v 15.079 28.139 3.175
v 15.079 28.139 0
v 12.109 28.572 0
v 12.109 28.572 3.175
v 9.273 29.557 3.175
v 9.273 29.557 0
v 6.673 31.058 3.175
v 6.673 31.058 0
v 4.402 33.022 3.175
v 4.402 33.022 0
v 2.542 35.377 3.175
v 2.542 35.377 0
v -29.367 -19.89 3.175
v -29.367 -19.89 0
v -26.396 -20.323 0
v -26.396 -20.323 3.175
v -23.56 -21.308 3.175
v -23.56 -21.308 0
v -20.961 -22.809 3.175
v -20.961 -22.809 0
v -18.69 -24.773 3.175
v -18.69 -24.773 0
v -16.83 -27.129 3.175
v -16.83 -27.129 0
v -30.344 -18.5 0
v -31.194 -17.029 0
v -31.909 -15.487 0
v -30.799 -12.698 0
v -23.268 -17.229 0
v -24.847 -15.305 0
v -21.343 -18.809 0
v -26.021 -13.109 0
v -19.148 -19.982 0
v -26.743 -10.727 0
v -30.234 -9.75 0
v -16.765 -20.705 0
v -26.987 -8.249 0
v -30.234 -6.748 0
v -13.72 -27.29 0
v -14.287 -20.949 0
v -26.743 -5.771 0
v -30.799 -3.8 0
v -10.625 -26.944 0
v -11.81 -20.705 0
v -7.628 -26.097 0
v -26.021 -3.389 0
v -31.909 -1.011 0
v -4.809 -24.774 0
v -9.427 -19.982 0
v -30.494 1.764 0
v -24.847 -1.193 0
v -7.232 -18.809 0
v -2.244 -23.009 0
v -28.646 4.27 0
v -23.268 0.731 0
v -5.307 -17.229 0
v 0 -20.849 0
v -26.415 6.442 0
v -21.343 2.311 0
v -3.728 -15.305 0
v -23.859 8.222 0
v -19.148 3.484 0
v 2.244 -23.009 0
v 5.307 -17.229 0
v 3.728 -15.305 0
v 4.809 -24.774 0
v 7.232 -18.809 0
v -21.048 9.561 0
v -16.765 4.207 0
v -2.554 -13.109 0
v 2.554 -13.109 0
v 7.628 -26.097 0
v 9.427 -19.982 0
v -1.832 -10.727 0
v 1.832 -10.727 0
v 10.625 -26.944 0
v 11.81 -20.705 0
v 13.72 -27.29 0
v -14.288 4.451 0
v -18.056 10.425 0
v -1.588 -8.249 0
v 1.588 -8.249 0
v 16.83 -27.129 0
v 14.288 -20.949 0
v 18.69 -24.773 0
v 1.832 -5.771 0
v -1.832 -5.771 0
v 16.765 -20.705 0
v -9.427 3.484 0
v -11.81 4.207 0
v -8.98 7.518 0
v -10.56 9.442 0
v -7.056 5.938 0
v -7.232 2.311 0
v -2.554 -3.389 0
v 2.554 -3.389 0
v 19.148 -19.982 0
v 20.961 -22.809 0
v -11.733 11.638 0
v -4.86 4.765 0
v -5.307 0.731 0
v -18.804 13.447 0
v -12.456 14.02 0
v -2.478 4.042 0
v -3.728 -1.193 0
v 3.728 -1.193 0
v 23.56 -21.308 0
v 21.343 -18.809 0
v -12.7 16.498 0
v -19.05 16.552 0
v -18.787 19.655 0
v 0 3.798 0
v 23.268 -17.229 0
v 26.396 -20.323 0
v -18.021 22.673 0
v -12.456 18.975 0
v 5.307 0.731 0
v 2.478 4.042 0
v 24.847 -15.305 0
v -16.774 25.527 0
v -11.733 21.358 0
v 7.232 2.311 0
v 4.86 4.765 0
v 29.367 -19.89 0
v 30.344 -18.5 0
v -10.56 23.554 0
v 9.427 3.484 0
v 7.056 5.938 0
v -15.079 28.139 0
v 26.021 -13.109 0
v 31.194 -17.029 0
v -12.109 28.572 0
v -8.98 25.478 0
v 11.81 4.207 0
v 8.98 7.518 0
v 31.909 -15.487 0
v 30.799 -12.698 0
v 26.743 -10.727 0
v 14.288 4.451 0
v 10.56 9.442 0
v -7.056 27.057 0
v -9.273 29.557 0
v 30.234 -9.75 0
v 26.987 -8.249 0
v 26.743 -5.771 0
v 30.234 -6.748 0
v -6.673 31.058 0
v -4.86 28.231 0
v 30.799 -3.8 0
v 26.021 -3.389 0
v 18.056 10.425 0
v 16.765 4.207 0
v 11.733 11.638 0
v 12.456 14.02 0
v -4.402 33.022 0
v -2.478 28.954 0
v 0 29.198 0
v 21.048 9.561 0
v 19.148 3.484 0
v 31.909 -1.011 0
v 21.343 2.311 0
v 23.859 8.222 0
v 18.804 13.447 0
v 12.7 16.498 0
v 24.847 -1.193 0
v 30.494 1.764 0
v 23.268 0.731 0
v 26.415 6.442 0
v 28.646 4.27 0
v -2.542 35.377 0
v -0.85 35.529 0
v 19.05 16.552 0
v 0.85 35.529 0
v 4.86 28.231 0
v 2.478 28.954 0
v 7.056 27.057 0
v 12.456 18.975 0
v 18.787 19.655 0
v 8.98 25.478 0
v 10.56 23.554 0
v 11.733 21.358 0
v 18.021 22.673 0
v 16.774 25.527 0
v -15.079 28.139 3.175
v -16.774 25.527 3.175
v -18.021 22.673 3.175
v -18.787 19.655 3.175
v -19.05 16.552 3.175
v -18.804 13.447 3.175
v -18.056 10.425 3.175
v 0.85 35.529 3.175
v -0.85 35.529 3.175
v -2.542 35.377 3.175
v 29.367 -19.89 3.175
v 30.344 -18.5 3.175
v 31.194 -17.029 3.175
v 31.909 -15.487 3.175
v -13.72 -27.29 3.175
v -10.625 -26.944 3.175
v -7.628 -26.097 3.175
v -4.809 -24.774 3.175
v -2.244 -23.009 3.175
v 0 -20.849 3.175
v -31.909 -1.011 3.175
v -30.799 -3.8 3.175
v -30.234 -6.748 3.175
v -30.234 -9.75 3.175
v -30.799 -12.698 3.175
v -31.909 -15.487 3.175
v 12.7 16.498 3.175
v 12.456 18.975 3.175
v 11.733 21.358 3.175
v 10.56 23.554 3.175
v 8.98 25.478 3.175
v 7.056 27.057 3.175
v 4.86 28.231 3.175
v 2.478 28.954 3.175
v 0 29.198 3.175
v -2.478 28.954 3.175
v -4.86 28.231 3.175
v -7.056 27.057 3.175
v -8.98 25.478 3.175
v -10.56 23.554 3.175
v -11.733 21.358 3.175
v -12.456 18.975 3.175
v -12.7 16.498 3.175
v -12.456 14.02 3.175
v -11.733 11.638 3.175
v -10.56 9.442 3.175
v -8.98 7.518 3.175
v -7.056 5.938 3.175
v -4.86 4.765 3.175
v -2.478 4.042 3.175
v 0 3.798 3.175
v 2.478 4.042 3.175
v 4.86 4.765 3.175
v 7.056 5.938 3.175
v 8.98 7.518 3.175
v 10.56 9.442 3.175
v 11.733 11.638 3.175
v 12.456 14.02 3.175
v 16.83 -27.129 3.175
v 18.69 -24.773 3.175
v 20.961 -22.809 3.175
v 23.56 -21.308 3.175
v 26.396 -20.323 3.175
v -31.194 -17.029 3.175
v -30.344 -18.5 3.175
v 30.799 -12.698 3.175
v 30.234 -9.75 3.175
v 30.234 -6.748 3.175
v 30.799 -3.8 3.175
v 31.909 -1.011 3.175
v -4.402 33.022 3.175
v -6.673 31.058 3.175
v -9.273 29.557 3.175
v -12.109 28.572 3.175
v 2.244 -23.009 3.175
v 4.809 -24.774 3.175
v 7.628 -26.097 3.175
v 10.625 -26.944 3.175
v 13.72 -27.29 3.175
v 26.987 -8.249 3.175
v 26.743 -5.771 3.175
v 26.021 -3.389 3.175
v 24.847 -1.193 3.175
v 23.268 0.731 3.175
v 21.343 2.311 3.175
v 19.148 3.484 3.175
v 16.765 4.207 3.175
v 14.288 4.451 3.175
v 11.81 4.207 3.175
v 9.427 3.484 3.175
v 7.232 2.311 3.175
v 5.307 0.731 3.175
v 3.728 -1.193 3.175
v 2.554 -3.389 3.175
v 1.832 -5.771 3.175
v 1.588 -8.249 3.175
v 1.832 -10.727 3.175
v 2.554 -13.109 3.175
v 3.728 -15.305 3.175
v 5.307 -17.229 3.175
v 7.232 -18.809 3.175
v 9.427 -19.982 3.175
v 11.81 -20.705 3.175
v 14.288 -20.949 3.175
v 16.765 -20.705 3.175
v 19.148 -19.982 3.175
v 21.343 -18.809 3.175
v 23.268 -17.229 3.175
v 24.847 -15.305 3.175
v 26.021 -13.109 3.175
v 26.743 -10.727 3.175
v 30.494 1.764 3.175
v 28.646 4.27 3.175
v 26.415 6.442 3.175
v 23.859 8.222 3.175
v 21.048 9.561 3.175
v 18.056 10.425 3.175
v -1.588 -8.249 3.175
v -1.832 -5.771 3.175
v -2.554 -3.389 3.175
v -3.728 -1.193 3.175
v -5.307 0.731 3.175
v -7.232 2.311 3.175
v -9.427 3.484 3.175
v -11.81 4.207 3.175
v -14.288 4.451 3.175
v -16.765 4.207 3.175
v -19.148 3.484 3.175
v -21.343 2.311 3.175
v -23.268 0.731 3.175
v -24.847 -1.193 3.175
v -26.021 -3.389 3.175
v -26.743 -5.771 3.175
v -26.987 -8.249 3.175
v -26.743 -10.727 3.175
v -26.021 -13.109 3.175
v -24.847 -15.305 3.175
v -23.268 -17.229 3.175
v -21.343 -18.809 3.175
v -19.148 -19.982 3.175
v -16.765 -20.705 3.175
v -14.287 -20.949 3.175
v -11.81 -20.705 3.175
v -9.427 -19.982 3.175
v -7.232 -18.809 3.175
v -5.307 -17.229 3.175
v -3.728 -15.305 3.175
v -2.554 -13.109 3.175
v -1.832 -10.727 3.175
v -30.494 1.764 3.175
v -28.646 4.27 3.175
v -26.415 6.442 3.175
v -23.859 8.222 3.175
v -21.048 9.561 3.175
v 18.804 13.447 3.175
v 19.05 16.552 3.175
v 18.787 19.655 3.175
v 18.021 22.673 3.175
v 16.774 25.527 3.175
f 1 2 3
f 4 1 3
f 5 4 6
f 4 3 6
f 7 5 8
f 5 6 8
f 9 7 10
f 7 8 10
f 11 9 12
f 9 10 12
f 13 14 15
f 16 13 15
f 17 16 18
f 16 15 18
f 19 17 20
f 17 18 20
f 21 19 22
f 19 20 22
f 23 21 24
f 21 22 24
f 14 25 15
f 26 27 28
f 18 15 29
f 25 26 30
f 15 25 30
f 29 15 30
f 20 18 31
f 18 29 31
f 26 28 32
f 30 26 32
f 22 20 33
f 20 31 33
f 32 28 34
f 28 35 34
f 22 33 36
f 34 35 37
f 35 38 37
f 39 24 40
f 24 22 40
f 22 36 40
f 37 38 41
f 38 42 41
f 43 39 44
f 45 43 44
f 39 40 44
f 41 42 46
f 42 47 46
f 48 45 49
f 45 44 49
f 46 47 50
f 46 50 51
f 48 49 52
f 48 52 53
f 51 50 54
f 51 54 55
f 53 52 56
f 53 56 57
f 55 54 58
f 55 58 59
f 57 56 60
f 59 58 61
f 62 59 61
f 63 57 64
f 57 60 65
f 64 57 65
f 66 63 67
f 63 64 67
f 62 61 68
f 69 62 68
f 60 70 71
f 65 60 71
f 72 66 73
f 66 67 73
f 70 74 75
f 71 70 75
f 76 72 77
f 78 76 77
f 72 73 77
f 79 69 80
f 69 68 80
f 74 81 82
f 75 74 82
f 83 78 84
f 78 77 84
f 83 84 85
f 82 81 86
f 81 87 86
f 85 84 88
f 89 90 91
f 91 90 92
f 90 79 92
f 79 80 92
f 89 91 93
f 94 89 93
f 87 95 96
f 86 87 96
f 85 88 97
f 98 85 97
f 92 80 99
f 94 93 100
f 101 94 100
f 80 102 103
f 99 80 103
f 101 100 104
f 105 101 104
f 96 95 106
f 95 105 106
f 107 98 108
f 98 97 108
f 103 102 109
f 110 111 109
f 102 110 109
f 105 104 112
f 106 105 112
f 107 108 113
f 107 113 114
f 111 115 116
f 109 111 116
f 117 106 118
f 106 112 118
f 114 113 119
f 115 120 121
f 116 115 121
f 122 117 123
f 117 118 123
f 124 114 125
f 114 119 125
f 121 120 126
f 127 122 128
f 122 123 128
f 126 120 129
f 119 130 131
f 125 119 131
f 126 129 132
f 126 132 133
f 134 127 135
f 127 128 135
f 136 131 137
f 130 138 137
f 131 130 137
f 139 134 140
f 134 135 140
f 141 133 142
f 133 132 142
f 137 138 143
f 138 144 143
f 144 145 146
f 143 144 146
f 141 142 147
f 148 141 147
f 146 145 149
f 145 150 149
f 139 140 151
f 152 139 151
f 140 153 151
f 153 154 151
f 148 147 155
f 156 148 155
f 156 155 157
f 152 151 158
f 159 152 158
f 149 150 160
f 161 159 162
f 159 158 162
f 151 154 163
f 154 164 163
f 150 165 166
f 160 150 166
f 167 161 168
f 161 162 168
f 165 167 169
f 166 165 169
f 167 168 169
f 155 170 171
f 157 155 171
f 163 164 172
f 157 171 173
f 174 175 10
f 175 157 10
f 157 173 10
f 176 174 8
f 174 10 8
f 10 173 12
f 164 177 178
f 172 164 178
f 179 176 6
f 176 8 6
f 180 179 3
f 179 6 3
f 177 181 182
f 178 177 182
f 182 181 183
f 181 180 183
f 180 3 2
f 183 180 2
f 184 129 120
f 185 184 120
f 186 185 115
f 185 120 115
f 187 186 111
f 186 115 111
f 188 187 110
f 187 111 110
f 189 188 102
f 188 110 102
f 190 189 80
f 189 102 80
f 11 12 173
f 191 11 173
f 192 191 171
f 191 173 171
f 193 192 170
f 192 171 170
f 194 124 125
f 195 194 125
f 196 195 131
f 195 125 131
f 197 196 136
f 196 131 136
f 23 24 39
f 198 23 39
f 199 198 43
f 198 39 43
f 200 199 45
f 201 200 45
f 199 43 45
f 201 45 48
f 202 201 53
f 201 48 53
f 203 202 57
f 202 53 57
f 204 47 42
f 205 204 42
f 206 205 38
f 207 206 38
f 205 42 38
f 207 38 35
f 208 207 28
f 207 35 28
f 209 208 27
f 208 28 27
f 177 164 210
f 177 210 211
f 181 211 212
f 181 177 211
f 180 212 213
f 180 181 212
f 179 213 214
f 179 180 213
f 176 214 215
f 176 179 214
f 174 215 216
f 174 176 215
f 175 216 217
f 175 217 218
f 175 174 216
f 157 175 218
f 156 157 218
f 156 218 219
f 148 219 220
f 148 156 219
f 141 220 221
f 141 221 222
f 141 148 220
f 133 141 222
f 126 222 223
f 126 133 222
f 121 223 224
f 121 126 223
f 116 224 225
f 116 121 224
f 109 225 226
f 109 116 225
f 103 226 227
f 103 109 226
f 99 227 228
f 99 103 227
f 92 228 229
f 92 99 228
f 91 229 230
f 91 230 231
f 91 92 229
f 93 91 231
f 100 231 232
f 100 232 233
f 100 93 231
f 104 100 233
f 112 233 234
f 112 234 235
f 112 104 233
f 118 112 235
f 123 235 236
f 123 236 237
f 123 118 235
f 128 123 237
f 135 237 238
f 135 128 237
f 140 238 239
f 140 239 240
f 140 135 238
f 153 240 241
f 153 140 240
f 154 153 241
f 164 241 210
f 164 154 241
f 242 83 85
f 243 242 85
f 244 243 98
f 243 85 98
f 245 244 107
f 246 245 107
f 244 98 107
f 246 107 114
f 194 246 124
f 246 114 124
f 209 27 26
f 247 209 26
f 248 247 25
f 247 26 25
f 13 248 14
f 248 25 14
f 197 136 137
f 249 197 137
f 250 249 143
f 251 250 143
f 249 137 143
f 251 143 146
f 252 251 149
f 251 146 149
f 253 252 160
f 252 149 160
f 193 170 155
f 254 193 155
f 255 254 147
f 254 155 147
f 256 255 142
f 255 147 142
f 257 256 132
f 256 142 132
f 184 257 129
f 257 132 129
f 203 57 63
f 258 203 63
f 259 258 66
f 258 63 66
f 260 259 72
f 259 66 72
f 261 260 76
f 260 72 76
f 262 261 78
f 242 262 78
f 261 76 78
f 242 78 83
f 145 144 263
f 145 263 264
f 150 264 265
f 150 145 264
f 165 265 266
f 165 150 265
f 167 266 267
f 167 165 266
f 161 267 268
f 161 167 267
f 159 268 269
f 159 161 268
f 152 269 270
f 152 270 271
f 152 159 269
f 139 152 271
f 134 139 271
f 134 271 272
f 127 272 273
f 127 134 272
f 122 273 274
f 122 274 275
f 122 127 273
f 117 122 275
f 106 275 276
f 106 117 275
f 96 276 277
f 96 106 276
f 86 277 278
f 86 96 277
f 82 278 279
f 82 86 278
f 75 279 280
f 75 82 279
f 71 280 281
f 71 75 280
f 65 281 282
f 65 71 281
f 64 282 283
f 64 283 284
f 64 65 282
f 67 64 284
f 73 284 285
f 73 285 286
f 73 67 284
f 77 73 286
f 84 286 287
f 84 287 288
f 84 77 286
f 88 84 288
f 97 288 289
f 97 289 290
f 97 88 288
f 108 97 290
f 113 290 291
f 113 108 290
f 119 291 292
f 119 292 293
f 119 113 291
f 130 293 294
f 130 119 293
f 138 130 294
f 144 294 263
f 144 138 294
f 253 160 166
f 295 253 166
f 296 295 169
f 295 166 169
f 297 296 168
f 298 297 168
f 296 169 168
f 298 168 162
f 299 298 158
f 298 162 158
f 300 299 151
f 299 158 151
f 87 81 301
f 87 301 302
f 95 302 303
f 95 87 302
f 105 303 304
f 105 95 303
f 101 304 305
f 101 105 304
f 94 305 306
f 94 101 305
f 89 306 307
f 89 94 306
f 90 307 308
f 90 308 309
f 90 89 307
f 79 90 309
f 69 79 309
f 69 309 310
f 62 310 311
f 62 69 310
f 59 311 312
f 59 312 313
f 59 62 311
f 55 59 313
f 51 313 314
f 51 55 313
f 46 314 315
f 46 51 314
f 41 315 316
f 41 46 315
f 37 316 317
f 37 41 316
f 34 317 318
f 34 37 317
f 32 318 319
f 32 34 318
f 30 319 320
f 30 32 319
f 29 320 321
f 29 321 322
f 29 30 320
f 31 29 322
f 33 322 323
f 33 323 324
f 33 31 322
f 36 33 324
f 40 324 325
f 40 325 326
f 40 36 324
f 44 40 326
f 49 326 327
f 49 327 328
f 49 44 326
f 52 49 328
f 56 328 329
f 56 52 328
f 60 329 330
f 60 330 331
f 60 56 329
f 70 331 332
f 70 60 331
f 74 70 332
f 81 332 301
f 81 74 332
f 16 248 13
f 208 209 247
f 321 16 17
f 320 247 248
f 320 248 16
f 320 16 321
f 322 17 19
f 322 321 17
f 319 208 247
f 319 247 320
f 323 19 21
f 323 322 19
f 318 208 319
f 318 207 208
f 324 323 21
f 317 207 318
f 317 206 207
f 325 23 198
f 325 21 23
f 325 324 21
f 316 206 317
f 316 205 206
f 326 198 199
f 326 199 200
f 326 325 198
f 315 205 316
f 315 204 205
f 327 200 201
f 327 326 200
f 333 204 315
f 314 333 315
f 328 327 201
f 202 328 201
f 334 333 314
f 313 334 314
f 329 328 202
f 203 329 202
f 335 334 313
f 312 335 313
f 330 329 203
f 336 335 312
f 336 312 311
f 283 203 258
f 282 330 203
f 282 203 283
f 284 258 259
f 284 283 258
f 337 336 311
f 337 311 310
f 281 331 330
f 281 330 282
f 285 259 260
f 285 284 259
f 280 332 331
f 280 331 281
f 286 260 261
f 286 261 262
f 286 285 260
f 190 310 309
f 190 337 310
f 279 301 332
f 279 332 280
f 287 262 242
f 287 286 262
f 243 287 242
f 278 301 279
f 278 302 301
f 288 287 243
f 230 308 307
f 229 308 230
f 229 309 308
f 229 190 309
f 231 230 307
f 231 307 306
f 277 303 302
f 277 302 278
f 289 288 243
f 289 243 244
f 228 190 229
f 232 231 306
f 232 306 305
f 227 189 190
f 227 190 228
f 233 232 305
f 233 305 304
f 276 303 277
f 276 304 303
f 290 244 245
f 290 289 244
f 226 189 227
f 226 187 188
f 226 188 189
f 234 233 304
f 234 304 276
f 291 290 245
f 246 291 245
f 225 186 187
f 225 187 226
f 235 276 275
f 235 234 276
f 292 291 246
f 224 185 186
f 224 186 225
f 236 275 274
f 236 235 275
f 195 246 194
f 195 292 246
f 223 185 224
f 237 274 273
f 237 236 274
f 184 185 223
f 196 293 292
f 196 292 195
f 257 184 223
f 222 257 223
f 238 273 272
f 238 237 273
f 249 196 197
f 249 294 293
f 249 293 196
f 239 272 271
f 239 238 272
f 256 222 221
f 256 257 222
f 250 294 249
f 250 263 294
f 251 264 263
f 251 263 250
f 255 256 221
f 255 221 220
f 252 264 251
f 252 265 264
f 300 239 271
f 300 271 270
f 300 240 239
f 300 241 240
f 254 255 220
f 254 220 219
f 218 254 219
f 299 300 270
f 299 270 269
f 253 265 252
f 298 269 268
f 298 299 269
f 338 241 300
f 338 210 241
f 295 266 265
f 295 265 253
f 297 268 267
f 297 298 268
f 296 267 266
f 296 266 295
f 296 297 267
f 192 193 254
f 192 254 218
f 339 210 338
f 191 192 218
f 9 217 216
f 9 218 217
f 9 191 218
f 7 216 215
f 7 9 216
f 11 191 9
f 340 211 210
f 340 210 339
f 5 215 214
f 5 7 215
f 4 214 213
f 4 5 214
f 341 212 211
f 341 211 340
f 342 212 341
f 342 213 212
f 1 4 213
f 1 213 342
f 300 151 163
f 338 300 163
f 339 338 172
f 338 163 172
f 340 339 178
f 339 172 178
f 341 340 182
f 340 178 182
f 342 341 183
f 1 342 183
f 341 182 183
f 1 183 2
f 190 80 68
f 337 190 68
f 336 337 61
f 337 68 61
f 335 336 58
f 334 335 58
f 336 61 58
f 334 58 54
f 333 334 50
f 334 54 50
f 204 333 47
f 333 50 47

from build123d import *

# Parameters (mm, degrees)
F0_R     = 12.7
F1_DEPTH = 3.175


with BuildPart() as f1:
    # F0 (on Top) → F1 (new body)
    with BuildSketch(Plane.XY):
        with BuildLine():
            ThreePointArc((-16.82951, -27.128529), (-7.628193, -26.097033), (0, -20.849283))
            ThreePointArc((0, -20.849283), (7.628193, -26.097033), (16.82951, -27.128529))
            ThreePointArc((16.82951, -27.128529), (22.225, -21.997045), (29.36674, -19.890155))
            ThreePointArc((29.36674, -19.890155), (30.785284, -17.773892), (31.90875, -15.487265))
            ThreePointArc((31.90875, -15.487265), (30.1625, -8.248892), (31.90875, -1.010519))
            ThreePointArc((31.90875, -1.010519), (26.41479, 6.442307), (18.056008, 10.424641))
            ThreePointArc((18.056008, 10.424641), (18.786597, 19.654725), (15.07924, 28.139047))
            ThreePointArc((15.07924, 28.139047), (7.9375, 30.245937), (2.54201, 35.377421))
            ThreePointArc((2.54201, 35.377421), (0, 35.547784), (-2.54201, 35.377421))
            ThreePointArc((-2.54201, 35.377421), (-7.9375, 30.245937), (-15.07924, 28.139047))
            ThreePointArc((-15.07924, 28.139047), (-18.786597, 19.654725), (-18.056008, 10.424641))
            ThreePointArc((-18.056008, 10.424641), (-26.41479, 6.442307), (-31.90875, -1.010519))
            ThreePointArc((-31.90875, -1.010519), (-30.1625, -8.248892), (-31.90875, -15.487265))
            ThreePointArc((-31.90875, -15.487265), (-30.785284, -17.773892), (-29.36674, -19.890155))
            ThreePointArc((-29.36674, -19.890155), (-22.225, -21.997045), (-16.82951, -27.128529))
        make_face()
        with Locations((-14.2875, -8.248892)):
            Circle(F0_R, mode=Mode.SUBTRACT)
        with Locations((14.2875, -8.248892)):
            Circle(F0_R, mode=Mode.SUBTRACT)
        with Locations((0, 16.497784)):
            Circle(F0_R, mode=Mode.SUBTRACT)
    extrude(amount=F1_DEPTH)


solid = f1.part
